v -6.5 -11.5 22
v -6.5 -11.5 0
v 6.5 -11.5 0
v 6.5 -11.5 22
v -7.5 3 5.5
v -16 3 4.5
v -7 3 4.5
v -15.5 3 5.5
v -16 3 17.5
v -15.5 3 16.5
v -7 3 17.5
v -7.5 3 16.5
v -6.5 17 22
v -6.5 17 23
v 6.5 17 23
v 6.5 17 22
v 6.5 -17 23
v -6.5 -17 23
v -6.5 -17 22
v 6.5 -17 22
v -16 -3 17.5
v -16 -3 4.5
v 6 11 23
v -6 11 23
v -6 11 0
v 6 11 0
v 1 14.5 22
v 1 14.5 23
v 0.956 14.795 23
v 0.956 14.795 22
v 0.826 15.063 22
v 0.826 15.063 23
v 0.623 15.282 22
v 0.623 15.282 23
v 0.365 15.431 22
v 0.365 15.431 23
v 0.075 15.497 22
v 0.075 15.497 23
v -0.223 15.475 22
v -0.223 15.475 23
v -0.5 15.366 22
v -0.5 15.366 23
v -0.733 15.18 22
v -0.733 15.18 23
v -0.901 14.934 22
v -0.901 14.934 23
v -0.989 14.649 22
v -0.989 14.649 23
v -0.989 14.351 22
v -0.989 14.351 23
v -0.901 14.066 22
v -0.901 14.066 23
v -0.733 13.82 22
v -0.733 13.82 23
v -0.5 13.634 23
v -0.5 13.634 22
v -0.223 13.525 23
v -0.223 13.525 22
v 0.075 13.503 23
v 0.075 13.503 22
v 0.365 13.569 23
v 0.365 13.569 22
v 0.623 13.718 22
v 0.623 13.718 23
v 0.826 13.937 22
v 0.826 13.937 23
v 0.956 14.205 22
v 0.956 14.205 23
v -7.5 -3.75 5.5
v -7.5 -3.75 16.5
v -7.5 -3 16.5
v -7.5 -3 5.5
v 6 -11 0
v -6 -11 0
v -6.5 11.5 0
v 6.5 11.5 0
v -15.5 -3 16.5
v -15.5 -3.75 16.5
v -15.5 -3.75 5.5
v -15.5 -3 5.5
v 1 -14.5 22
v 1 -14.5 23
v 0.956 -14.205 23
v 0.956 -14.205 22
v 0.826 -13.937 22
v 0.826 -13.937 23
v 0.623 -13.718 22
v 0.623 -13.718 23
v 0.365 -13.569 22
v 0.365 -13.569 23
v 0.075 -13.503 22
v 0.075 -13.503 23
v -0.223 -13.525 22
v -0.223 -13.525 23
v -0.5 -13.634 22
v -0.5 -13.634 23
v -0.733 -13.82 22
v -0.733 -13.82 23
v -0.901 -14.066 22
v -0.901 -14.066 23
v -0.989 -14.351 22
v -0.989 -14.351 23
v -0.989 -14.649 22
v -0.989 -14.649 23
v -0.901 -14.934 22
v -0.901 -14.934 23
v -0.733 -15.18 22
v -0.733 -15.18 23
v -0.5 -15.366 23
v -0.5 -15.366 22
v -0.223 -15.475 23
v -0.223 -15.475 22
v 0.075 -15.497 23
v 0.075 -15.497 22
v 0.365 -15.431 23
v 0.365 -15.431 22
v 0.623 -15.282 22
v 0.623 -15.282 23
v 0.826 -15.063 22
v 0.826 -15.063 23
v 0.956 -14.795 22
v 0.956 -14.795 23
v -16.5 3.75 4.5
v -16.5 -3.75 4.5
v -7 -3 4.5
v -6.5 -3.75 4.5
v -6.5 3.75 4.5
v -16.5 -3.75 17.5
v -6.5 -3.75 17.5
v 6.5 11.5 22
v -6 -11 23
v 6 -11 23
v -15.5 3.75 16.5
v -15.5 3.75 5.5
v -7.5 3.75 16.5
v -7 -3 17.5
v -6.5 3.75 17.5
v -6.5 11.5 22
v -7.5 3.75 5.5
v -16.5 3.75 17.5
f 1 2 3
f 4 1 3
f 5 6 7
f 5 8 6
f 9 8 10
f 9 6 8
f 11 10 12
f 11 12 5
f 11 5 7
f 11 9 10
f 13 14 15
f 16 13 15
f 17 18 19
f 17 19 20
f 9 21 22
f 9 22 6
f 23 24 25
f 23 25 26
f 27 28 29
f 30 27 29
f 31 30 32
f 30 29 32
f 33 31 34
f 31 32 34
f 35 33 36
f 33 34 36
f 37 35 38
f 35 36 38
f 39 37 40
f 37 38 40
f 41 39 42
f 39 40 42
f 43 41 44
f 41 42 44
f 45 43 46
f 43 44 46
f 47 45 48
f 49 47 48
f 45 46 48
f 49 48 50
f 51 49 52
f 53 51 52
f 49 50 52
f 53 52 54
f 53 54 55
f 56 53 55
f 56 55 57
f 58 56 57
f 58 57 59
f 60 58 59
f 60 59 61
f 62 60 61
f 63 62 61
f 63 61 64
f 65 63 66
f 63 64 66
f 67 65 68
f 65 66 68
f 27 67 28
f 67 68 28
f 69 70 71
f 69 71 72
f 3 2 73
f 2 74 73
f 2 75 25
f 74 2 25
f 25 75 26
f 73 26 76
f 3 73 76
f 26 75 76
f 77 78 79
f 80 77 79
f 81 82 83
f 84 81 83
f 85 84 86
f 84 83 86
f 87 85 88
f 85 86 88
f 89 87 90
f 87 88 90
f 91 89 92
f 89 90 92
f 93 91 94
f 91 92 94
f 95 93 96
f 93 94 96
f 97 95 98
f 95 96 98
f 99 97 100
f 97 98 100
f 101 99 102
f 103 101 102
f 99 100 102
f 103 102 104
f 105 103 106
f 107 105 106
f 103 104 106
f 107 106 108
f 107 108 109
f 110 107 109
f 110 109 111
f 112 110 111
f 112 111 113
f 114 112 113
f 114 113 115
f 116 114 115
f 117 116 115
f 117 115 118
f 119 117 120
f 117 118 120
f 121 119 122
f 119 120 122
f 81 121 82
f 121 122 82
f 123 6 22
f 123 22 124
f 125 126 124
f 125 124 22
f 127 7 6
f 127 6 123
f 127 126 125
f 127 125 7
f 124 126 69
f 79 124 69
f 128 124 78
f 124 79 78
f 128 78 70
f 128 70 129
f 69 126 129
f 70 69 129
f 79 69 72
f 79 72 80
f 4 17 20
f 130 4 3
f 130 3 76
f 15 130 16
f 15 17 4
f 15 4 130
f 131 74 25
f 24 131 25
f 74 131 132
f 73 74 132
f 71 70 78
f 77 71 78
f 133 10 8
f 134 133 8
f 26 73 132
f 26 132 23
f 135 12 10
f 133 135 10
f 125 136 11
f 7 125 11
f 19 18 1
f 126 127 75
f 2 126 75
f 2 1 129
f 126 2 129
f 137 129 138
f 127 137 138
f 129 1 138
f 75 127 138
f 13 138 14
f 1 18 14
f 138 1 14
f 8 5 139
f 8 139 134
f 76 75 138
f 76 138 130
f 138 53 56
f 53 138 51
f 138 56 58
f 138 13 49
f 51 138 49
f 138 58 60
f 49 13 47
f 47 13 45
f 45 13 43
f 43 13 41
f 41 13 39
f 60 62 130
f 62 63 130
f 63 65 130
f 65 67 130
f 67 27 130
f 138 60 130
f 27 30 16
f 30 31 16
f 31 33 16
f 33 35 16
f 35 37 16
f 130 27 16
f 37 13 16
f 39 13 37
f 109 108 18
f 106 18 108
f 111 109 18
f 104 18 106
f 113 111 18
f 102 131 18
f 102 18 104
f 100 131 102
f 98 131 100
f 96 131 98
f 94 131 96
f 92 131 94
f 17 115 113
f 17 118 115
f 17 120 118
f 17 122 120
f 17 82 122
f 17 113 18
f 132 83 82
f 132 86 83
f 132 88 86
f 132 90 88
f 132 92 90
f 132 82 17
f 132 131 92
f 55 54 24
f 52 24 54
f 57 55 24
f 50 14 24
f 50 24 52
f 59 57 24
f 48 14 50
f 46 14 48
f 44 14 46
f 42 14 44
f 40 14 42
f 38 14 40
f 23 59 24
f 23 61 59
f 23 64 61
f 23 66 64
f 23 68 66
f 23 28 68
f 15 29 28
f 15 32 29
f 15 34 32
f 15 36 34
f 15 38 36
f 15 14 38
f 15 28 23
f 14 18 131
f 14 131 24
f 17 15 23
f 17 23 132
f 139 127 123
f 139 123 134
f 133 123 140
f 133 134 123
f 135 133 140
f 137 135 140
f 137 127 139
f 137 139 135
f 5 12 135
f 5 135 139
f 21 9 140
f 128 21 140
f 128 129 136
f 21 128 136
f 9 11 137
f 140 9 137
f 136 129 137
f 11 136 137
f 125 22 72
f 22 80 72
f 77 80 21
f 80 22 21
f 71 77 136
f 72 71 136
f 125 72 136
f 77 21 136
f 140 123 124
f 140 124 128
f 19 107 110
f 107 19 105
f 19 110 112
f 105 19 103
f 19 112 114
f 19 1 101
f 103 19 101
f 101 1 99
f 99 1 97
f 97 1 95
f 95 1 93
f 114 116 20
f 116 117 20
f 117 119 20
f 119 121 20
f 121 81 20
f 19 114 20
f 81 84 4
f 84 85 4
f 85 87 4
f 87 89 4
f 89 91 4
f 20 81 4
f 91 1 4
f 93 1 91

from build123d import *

# Parameters (mm, degrees)
SKETCH1_W           = 13
SKETCH1_H           = 23
BOSS_EXTRUDE1_DEPTH = 23
CUT_EXTRUDE1_REACH  = 28.524
SKETCH1_3_W         = 12
SKETCH1_3_H         = 22
SKETCH2_W           = 13
SKETCH2_H           = 5.5
SKETCH2_R           = 1
BOSS_EXTRUDE2_DEPTH = 1
SKETCH4_W           = 13
SKETCH4_H           = 7.5
BOSS_EXTRUDE3_DEPTH = 10
CUT_EXTRUDE2_REACH  = 37.097
SKETCH5_W           = 8
SKETCH5_H           = 11
CUT_EXTRUDE3_REACH  = 31.453
SKETCH6_W           = 9
SKETCH6_H           = 6


with BuildPart() as part:
    # Sketch1 → Boss-Extrude1 (new body)
    with BuildSketch(Plane.XY):
        Rectangle(SKETCH1_W, SKETCH1_H)
    extrude(amount=BOSS_EXTRUDE1_DEPTH)

    # Sketch1<3> → Cut-Extrude1 (cut, up to next)
    with BuildSketch(Plane.XY, mode=Mode.PRIVATE) as cut_extrude1_sk1:
        Rectangle(SKETCH1_3_W, SKETCH1_3_H)
    cut_extrude1_tool1 = extrude(cut_extrude1_sk1.sketch, amount=CUT_EXTRUDE1_REACH, mode=Mode.PRIVATE) & part.part
    add(cut_extrude1_tool1.solids().sort_by_distance((0, 0, 0))[0], mode=Mode.SUBTRACT)

    # Sketch2 → Boss-Extrude2 (add)
    # profile 1 of 2: a face of its own
    with BuildSketch(Plane.XY.offset(23)):
        with Locations((0, 14.25)):
            Rectangle(SKETCH2_W, SKETCH2_H)
        with Locations((0, 14.5)):
            Circle(SKETCH2_R, mode=Mode.SUBTRACT)
    # profile 2 of 2: a face of its own
    with BuildSketch(Plane.XY.offset(23)):
        with Locations((0, -14.25)):
            Rectangle(SKETCH2_W, SKETCH2_H)
        with Locations((0, -14.5)):
            Circle(SKETCH2_R, mode=Mode.SUBTRACT)
    extrude(amount=-BOSS_EXTRUDE2_DEPTH)

    # Sketch4 → Boss-Extrude3 (add)
    with BuildSketch(Plane.ZY.offset(6.5)):
        with Locations((11, 0)):
            Rectangle(SKETCH4_W, SKETCH4_H)
    extrude(amount=BOSS_EXTRUDE3_DEPTH)

    # Sketch5 → Cut-Extrude2 (cut, up to next)
    with BuildSketch(Plane(origin=(0, -3.75, 0), x_dir=(-1, 0, 0), z_dir=(0, -1, 0)), mode=Mode.PRIVATE) as cut_extrude2_sk1:
        with Locations((11.5, -11)):
            Rectangle(SKETCH5_W, SKETCH5_H)
    cut_extrude2_tool1 = extrude(cut_extrude2_sk1.sketch, amount=-CUT_EXTRUDE2_REACH, mode=Mode.PRIVATE) & part.part
    add(cut_extrude2_tool1.solids().sort_by_distance((-11.5, -3.75, 11))[0], mode=Mode.SUBTRACT)

    # Sketch6 → Cut-Extrude3 (cut, up to next)
    with BuildSketch(Plane.XY.offset(17.5), mode=Mode.PRIVATE) as cut_extrude3_sk1:
        with Locations((-11.5, 0)):
            Rectangle(SKETCH6_W, SKETCH6_H)
    cut_extrude3_tool1 = extrude(cut_extrude3_sk1.sketch, amount=-CUT_EXTRUDE3_REACH, mode=Mode.PRIVATE) & part.part
    add(cut_extrude3_tool1.solids().sort_by_distance((-11.5, 0, 17.5))[0], mode=Mode.SUBTRACT)


solid = part.part
